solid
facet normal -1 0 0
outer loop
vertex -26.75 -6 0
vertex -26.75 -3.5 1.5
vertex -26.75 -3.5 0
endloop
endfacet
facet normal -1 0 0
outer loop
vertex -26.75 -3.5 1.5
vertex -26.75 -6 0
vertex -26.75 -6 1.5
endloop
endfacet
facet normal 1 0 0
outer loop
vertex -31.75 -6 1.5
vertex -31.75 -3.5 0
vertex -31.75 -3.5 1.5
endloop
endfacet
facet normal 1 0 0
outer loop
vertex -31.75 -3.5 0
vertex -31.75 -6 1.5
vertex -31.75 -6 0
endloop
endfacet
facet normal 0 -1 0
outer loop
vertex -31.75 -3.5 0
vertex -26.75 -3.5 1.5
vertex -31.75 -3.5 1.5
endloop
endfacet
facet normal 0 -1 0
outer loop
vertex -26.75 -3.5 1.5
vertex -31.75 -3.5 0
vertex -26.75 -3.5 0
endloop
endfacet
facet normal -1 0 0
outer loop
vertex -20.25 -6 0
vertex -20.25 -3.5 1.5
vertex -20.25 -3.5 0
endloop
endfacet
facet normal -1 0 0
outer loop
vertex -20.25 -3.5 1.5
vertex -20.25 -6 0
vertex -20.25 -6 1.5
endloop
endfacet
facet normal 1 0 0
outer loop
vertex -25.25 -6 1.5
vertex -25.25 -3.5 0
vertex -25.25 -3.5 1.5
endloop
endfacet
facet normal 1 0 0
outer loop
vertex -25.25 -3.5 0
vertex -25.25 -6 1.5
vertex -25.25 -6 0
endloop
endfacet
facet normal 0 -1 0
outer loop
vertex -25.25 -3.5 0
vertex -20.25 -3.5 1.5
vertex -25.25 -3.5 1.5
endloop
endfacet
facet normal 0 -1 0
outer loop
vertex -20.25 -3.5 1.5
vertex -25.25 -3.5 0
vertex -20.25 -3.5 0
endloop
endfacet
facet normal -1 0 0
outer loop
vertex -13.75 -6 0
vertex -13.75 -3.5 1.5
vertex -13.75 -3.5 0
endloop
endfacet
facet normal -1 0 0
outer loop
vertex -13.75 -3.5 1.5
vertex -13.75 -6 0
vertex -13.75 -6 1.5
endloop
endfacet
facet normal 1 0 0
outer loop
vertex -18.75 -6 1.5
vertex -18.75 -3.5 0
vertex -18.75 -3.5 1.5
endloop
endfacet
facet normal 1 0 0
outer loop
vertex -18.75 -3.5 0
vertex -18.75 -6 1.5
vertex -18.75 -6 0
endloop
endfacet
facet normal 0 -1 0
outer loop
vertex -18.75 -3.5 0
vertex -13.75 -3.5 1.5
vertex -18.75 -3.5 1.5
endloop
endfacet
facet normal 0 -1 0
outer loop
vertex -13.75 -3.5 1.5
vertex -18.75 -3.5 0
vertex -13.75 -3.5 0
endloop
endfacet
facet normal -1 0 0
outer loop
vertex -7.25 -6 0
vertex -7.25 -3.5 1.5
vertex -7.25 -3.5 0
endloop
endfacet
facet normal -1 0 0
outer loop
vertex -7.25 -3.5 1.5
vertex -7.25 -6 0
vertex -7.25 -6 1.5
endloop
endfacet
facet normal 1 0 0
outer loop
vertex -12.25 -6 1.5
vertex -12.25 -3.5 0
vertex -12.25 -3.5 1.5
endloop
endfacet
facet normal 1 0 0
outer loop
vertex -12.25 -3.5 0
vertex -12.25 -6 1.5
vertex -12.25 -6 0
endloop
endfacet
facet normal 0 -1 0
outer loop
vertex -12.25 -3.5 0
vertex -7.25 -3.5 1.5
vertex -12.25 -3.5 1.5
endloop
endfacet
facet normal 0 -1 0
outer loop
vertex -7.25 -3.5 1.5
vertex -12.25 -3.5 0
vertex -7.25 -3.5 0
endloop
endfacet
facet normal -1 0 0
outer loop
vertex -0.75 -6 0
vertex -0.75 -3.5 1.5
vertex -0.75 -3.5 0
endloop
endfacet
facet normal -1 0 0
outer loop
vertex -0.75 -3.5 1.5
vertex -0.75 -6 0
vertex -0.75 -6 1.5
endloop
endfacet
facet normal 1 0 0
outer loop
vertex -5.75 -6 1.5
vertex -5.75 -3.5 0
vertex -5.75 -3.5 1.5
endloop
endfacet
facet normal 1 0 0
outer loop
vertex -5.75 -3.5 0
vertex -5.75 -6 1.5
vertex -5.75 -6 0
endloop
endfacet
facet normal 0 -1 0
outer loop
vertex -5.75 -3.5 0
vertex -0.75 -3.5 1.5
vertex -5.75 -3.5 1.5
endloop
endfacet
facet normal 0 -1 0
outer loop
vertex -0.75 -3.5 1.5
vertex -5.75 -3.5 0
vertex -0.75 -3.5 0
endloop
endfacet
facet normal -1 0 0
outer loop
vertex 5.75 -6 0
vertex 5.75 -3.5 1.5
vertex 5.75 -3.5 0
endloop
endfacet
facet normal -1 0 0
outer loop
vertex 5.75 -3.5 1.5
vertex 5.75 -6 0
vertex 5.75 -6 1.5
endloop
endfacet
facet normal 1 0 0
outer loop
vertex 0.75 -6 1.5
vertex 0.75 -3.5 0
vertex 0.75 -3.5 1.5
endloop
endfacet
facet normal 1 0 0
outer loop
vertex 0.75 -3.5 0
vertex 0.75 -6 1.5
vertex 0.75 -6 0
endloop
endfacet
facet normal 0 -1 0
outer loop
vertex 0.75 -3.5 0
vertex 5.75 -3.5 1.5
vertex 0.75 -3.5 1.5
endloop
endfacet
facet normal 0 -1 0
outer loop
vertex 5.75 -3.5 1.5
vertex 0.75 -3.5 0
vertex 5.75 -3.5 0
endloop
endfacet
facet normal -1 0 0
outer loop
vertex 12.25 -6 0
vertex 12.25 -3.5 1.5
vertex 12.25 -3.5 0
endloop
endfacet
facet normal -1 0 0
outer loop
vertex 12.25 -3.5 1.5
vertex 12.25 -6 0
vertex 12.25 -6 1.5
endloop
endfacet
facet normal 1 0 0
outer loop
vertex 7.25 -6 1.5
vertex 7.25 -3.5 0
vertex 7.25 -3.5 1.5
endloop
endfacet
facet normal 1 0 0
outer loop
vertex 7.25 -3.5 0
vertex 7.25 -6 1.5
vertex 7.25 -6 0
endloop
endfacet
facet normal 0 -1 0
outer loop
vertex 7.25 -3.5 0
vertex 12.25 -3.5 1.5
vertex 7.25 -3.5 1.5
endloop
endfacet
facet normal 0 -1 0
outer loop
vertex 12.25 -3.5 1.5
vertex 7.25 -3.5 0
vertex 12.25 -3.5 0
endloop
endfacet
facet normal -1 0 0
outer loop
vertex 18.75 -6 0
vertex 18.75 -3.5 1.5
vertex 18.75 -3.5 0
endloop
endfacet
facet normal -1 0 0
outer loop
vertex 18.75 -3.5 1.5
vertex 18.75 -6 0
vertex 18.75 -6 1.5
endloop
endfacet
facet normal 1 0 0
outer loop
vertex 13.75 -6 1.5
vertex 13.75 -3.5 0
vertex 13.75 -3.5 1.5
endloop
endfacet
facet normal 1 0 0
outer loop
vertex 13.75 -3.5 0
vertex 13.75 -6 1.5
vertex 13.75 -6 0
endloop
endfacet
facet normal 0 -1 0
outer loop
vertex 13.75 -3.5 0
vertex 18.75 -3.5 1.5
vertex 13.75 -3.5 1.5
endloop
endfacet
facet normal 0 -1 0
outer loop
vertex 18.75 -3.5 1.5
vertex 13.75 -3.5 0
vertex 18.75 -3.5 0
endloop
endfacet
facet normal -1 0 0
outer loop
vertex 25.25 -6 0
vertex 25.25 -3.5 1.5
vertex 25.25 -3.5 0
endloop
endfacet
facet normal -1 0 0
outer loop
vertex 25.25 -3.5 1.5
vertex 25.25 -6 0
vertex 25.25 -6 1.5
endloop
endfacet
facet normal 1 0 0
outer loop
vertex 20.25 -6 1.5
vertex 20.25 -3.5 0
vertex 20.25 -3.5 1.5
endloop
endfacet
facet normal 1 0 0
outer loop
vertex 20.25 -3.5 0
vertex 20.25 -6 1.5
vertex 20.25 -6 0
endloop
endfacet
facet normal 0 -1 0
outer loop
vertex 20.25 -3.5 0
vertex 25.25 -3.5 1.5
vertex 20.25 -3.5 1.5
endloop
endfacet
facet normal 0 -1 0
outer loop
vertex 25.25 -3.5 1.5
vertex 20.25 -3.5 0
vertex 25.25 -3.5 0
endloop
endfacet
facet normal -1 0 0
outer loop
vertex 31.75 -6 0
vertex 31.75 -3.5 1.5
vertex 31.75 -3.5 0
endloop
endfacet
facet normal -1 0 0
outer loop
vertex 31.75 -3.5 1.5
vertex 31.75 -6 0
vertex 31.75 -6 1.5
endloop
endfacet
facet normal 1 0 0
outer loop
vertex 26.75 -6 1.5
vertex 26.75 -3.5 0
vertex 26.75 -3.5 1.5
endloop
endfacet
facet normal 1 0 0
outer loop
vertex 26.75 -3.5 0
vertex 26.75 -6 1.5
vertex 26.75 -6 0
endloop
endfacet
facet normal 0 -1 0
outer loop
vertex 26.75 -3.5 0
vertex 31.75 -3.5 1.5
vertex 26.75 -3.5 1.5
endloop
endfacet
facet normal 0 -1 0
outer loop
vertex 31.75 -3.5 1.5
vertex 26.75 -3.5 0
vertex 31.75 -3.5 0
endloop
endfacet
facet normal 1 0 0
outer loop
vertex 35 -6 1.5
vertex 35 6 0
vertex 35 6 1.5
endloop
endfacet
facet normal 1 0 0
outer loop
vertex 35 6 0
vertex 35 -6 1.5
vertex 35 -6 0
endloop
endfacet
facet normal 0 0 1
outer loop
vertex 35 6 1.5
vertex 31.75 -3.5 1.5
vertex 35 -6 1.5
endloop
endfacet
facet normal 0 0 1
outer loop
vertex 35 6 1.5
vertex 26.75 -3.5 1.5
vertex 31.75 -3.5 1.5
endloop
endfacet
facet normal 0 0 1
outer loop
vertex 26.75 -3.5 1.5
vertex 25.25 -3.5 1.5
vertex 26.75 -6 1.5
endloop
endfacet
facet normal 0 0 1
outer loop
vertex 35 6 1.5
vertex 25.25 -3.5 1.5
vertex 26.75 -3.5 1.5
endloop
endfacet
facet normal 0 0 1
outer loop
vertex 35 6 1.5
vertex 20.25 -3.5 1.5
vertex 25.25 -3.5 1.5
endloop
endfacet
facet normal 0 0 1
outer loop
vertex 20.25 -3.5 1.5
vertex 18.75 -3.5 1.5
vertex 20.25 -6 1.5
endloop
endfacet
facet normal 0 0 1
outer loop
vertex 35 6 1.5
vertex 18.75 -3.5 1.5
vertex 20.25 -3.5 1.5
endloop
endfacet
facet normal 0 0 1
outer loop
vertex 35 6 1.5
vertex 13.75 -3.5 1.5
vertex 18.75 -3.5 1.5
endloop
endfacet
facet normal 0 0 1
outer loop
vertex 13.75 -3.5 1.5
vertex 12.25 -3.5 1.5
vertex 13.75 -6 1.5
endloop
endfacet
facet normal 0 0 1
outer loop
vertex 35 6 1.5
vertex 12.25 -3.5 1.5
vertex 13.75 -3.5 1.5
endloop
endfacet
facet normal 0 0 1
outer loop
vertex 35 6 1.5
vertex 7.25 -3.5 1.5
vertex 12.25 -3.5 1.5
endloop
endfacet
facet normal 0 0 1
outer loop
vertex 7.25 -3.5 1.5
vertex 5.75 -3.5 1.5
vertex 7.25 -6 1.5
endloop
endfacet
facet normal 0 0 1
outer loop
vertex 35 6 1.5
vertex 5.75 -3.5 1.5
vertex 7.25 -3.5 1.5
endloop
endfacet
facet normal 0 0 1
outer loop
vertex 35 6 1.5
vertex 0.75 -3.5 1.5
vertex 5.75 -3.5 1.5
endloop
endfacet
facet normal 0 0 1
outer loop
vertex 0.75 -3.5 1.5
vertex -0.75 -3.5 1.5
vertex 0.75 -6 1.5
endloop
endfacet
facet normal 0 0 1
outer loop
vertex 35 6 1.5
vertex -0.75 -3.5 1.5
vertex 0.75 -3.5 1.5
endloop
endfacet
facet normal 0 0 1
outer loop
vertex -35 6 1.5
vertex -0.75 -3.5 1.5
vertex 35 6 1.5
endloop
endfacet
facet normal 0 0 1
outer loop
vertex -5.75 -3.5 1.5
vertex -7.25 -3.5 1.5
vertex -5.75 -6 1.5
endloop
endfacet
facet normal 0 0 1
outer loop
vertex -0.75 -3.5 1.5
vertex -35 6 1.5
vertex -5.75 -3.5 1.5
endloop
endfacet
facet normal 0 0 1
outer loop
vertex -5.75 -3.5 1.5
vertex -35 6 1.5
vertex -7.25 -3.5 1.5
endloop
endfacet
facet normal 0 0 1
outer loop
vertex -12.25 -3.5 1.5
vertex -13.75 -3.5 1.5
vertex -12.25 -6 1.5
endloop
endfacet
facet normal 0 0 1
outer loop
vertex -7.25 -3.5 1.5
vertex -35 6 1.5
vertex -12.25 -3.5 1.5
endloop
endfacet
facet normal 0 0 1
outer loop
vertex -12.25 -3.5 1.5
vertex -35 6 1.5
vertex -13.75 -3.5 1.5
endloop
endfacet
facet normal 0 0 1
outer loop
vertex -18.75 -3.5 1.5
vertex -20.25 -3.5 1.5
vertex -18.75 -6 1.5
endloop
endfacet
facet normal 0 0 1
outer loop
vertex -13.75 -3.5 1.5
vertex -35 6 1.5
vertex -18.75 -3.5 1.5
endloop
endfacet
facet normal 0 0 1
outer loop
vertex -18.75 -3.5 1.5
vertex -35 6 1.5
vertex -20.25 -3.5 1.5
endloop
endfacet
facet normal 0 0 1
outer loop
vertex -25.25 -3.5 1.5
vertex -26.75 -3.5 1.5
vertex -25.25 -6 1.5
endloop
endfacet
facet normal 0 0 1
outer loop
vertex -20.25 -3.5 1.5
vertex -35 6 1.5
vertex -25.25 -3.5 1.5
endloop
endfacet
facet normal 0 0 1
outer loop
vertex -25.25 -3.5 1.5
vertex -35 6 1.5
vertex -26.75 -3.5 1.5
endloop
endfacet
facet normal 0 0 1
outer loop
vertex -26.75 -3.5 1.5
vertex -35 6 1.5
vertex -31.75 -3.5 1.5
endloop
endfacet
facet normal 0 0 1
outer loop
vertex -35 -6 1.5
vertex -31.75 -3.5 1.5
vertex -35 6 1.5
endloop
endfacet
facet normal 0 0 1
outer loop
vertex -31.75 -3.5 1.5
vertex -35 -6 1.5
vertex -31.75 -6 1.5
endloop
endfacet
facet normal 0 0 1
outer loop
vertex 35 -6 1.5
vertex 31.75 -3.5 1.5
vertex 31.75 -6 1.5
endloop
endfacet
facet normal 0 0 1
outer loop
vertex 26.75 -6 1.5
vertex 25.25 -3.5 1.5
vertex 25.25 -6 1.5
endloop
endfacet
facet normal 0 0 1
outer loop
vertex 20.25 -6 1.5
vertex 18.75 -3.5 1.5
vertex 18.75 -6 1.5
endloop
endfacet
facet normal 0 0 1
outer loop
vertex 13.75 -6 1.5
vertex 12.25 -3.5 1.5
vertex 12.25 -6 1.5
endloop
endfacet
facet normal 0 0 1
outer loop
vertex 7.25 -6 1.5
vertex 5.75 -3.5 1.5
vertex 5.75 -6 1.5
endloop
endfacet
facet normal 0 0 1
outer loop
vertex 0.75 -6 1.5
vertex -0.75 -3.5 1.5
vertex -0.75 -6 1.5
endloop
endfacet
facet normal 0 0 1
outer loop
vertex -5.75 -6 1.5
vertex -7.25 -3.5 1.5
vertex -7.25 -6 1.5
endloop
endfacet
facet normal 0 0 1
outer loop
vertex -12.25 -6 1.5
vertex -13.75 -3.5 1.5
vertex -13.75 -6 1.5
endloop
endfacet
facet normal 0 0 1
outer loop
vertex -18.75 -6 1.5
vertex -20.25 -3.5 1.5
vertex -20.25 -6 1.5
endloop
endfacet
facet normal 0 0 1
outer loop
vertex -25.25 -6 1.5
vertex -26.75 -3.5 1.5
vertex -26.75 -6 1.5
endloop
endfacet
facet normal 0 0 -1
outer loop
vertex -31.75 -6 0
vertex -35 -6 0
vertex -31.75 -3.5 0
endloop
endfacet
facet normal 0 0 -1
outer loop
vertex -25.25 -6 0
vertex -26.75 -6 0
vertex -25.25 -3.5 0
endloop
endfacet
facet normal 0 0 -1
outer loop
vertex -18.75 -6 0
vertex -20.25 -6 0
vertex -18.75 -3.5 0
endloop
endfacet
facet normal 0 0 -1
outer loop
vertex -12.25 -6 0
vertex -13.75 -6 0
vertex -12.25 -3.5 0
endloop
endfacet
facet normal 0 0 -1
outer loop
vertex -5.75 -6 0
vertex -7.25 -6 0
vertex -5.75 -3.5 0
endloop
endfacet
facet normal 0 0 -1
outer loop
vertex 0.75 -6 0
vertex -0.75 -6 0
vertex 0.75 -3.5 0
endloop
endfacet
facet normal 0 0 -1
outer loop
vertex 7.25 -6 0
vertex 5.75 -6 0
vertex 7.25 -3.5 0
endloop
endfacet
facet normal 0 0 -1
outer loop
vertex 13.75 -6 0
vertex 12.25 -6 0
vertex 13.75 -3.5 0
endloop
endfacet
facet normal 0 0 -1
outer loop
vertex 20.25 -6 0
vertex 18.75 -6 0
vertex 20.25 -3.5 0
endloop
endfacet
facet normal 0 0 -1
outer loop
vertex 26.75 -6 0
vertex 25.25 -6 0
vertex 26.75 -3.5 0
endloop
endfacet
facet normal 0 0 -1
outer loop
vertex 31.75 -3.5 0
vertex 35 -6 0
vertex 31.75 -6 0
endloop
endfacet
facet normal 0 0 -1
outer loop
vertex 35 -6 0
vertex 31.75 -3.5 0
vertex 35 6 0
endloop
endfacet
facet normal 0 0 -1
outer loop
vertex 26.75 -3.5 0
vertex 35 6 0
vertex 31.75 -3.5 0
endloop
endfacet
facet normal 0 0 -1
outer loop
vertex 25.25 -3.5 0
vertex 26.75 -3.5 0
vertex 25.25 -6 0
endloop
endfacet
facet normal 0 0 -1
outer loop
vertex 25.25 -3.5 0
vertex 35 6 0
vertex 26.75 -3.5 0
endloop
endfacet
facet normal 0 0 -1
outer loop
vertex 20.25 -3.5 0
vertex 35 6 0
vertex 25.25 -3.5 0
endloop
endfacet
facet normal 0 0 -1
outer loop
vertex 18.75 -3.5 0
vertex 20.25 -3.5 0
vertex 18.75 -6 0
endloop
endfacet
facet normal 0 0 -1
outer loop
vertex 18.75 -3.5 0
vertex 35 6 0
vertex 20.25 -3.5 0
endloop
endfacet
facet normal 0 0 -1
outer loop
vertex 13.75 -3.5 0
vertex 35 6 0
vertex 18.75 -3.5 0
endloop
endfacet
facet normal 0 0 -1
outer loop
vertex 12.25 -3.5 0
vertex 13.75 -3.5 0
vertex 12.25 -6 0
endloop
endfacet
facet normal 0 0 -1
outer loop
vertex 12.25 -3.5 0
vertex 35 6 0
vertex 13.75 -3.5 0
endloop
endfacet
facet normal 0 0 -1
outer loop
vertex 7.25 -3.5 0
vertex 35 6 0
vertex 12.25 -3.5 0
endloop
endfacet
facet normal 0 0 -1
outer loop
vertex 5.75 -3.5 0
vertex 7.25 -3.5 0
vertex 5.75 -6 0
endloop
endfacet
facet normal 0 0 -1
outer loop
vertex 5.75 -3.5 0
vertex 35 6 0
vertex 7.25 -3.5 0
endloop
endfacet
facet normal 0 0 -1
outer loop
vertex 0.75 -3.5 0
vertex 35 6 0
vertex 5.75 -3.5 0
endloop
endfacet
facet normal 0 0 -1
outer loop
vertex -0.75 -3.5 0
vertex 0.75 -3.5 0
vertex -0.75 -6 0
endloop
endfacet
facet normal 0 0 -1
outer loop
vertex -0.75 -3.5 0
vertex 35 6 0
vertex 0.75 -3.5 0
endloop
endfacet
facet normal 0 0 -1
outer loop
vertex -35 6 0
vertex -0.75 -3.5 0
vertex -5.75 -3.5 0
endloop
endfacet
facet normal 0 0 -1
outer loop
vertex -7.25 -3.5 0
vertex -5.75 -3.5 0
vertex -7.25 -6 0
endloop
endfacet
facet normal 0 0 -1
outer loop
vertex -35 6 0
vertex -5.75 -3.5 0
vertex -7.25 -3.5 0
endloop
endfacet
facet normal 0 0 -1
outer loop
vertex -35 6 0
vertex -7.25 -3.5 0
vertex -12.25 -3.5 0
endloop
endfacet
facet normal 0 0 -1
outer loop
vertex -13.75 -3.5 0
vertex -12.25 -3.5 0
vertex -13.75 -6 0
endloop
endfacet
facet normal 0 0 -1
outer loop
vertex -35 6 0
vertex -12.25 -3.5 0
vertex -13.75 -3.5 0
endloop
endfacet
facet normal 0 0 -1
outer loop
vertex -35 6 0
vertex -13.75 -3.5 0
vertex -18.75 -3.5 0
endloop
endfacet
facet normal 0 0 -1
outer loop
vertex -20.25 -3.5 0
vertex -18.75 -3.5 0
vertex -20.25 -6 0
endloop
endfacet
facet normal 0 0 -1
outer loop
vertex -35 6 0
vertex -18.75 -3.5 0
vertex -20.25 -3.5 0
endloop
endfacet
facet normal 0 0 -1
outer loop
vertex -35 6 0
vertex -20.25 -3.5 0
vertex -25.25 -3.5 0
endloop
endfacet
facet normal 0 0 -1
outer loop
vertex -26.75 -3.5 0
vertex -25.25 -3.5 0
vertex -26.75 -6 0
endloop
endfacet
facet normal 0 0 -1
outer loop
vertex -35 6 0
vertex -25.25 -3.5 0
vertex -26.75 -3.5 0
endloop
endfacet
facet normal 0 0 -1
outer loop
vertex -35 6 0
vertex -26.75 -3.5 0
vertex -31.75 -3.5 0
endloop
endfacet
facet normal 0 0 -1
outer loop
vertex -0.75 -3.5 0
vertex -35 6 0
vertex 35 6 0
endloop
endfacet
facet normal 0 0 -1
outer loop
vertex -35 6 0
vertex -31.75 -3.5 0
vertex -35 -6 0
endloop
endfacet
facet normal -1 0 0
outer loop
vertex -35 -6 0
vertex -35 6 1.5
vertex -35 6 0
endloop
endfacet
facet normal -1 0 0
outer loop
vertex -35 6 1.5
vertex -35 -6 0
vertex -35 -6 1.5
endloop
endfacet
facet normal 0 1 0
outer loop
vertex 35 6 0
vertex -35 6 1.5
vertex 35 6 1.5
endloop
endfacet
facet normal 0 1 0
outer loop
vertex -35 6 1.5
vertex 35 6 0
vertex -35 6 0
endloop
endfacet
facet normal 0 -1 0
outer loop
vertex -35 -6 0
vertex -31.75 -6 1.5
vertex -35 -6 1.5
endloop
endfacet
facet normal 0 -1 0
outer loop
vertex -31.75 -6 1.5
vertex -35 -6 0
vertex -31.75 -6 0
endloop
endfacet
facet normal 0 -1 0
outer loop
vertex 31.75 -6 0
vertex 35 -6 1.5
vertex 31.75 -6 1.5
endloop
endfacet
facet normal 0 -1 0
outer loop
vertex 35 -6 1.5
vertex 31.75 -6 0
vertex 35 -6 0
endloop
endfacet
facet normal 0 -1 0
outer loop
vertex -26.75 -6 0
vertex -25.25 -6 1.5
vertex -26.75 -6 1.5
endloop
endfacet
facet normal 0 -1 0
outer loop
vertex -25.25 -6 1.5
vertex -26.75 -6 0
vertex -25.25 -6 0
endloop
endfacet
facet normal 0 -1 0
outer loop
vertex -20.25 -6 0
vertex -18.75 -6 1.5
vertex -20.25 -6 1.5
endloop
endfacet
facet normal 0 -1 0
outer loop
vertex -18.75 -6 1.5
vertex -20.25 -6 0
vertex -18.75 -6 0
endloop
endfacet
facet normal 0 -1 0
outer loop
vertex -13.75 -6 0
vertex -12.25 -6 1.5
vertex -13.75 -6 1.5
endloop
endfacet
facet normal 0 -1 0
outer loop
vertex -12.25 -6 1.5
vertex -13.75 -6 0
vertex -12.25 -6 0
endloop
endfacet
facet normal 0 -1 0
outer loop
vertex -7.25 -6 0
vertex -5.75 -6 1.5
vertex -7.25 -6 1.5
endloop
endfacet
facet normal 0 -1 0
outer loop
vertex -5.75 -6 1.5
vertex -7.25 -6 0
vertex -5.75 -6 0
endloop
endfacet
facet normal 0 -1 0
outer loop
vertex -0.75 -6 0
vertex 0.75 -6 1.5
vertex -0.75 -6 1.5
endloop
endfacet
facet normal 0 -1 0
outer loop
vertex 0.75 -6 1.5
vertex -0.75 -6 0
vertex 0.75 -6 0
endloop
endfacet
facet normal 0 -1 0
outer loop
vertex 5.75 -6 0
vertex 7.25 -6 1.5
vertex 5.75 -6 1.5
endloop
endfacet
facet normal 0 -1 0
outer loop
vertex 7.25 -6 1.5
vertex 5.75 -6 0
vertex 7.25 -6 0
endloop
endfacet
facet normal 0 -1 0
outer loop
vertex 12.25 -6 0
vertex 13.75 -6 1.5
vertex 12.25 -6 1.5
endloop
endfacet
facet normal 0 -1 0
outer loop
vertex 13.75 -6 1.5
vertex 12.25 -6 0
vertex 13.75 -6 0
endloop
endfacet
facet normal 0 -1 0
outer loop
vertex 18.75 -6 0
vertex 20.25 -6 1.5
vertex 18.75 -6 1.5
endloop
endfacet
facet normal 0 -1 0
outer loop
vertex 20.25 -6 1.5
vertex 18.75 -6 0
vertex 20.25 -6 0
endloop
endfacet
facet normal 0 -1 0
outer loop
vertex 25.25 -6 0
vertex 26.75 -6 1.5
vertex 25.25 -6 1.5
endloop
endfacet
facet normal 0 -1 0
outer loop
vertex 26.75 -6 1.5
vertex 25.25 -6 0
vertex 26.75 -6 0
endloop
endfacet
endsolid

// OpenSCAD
// 10-well comb for agarose gel casting, printed lying flat
// Units: mm

$fn = 64;

// Spine (back bar)
spine_len   = 70;   // length along X
spine_wid   = 12;   // width along Y

// Teeth
tooth_count = 10;   // number of teeth
tooth_w     = 5.0;  // tooth width along X
tooth_l     = 12;   // tooth length along Y (hangs in -Y)
tooth_gap   = 1.5;  // gap between neighbouring teeth along X

// Plate
plate_t     = 1.5;  // plate thickness along Z

// Derived
pitch       = tooth_w + tooth_gap;  // centre-to-centre spacing along X
overcut     = 0.5;                  // cutter overshoot past faces

difference() {
    // Base plate
    translate([-spine_len/2, -spine_wid/2, 0])
        cube([spine_len, spine_wid, plate_t]);

    // Teeth, centred on spine in X
    for (i = [0 : tooth_count - 1]) {
        x = (i - (tooth_count - 1)/2) * pitch;
        translate([x - tooth_w/2, -spine_wid/2 - tooth_l, -overcut])
            cube([tooth_w, tooth_l + plate_t + 2*overcut, plate_t + 2*overcut]);
    }
}
